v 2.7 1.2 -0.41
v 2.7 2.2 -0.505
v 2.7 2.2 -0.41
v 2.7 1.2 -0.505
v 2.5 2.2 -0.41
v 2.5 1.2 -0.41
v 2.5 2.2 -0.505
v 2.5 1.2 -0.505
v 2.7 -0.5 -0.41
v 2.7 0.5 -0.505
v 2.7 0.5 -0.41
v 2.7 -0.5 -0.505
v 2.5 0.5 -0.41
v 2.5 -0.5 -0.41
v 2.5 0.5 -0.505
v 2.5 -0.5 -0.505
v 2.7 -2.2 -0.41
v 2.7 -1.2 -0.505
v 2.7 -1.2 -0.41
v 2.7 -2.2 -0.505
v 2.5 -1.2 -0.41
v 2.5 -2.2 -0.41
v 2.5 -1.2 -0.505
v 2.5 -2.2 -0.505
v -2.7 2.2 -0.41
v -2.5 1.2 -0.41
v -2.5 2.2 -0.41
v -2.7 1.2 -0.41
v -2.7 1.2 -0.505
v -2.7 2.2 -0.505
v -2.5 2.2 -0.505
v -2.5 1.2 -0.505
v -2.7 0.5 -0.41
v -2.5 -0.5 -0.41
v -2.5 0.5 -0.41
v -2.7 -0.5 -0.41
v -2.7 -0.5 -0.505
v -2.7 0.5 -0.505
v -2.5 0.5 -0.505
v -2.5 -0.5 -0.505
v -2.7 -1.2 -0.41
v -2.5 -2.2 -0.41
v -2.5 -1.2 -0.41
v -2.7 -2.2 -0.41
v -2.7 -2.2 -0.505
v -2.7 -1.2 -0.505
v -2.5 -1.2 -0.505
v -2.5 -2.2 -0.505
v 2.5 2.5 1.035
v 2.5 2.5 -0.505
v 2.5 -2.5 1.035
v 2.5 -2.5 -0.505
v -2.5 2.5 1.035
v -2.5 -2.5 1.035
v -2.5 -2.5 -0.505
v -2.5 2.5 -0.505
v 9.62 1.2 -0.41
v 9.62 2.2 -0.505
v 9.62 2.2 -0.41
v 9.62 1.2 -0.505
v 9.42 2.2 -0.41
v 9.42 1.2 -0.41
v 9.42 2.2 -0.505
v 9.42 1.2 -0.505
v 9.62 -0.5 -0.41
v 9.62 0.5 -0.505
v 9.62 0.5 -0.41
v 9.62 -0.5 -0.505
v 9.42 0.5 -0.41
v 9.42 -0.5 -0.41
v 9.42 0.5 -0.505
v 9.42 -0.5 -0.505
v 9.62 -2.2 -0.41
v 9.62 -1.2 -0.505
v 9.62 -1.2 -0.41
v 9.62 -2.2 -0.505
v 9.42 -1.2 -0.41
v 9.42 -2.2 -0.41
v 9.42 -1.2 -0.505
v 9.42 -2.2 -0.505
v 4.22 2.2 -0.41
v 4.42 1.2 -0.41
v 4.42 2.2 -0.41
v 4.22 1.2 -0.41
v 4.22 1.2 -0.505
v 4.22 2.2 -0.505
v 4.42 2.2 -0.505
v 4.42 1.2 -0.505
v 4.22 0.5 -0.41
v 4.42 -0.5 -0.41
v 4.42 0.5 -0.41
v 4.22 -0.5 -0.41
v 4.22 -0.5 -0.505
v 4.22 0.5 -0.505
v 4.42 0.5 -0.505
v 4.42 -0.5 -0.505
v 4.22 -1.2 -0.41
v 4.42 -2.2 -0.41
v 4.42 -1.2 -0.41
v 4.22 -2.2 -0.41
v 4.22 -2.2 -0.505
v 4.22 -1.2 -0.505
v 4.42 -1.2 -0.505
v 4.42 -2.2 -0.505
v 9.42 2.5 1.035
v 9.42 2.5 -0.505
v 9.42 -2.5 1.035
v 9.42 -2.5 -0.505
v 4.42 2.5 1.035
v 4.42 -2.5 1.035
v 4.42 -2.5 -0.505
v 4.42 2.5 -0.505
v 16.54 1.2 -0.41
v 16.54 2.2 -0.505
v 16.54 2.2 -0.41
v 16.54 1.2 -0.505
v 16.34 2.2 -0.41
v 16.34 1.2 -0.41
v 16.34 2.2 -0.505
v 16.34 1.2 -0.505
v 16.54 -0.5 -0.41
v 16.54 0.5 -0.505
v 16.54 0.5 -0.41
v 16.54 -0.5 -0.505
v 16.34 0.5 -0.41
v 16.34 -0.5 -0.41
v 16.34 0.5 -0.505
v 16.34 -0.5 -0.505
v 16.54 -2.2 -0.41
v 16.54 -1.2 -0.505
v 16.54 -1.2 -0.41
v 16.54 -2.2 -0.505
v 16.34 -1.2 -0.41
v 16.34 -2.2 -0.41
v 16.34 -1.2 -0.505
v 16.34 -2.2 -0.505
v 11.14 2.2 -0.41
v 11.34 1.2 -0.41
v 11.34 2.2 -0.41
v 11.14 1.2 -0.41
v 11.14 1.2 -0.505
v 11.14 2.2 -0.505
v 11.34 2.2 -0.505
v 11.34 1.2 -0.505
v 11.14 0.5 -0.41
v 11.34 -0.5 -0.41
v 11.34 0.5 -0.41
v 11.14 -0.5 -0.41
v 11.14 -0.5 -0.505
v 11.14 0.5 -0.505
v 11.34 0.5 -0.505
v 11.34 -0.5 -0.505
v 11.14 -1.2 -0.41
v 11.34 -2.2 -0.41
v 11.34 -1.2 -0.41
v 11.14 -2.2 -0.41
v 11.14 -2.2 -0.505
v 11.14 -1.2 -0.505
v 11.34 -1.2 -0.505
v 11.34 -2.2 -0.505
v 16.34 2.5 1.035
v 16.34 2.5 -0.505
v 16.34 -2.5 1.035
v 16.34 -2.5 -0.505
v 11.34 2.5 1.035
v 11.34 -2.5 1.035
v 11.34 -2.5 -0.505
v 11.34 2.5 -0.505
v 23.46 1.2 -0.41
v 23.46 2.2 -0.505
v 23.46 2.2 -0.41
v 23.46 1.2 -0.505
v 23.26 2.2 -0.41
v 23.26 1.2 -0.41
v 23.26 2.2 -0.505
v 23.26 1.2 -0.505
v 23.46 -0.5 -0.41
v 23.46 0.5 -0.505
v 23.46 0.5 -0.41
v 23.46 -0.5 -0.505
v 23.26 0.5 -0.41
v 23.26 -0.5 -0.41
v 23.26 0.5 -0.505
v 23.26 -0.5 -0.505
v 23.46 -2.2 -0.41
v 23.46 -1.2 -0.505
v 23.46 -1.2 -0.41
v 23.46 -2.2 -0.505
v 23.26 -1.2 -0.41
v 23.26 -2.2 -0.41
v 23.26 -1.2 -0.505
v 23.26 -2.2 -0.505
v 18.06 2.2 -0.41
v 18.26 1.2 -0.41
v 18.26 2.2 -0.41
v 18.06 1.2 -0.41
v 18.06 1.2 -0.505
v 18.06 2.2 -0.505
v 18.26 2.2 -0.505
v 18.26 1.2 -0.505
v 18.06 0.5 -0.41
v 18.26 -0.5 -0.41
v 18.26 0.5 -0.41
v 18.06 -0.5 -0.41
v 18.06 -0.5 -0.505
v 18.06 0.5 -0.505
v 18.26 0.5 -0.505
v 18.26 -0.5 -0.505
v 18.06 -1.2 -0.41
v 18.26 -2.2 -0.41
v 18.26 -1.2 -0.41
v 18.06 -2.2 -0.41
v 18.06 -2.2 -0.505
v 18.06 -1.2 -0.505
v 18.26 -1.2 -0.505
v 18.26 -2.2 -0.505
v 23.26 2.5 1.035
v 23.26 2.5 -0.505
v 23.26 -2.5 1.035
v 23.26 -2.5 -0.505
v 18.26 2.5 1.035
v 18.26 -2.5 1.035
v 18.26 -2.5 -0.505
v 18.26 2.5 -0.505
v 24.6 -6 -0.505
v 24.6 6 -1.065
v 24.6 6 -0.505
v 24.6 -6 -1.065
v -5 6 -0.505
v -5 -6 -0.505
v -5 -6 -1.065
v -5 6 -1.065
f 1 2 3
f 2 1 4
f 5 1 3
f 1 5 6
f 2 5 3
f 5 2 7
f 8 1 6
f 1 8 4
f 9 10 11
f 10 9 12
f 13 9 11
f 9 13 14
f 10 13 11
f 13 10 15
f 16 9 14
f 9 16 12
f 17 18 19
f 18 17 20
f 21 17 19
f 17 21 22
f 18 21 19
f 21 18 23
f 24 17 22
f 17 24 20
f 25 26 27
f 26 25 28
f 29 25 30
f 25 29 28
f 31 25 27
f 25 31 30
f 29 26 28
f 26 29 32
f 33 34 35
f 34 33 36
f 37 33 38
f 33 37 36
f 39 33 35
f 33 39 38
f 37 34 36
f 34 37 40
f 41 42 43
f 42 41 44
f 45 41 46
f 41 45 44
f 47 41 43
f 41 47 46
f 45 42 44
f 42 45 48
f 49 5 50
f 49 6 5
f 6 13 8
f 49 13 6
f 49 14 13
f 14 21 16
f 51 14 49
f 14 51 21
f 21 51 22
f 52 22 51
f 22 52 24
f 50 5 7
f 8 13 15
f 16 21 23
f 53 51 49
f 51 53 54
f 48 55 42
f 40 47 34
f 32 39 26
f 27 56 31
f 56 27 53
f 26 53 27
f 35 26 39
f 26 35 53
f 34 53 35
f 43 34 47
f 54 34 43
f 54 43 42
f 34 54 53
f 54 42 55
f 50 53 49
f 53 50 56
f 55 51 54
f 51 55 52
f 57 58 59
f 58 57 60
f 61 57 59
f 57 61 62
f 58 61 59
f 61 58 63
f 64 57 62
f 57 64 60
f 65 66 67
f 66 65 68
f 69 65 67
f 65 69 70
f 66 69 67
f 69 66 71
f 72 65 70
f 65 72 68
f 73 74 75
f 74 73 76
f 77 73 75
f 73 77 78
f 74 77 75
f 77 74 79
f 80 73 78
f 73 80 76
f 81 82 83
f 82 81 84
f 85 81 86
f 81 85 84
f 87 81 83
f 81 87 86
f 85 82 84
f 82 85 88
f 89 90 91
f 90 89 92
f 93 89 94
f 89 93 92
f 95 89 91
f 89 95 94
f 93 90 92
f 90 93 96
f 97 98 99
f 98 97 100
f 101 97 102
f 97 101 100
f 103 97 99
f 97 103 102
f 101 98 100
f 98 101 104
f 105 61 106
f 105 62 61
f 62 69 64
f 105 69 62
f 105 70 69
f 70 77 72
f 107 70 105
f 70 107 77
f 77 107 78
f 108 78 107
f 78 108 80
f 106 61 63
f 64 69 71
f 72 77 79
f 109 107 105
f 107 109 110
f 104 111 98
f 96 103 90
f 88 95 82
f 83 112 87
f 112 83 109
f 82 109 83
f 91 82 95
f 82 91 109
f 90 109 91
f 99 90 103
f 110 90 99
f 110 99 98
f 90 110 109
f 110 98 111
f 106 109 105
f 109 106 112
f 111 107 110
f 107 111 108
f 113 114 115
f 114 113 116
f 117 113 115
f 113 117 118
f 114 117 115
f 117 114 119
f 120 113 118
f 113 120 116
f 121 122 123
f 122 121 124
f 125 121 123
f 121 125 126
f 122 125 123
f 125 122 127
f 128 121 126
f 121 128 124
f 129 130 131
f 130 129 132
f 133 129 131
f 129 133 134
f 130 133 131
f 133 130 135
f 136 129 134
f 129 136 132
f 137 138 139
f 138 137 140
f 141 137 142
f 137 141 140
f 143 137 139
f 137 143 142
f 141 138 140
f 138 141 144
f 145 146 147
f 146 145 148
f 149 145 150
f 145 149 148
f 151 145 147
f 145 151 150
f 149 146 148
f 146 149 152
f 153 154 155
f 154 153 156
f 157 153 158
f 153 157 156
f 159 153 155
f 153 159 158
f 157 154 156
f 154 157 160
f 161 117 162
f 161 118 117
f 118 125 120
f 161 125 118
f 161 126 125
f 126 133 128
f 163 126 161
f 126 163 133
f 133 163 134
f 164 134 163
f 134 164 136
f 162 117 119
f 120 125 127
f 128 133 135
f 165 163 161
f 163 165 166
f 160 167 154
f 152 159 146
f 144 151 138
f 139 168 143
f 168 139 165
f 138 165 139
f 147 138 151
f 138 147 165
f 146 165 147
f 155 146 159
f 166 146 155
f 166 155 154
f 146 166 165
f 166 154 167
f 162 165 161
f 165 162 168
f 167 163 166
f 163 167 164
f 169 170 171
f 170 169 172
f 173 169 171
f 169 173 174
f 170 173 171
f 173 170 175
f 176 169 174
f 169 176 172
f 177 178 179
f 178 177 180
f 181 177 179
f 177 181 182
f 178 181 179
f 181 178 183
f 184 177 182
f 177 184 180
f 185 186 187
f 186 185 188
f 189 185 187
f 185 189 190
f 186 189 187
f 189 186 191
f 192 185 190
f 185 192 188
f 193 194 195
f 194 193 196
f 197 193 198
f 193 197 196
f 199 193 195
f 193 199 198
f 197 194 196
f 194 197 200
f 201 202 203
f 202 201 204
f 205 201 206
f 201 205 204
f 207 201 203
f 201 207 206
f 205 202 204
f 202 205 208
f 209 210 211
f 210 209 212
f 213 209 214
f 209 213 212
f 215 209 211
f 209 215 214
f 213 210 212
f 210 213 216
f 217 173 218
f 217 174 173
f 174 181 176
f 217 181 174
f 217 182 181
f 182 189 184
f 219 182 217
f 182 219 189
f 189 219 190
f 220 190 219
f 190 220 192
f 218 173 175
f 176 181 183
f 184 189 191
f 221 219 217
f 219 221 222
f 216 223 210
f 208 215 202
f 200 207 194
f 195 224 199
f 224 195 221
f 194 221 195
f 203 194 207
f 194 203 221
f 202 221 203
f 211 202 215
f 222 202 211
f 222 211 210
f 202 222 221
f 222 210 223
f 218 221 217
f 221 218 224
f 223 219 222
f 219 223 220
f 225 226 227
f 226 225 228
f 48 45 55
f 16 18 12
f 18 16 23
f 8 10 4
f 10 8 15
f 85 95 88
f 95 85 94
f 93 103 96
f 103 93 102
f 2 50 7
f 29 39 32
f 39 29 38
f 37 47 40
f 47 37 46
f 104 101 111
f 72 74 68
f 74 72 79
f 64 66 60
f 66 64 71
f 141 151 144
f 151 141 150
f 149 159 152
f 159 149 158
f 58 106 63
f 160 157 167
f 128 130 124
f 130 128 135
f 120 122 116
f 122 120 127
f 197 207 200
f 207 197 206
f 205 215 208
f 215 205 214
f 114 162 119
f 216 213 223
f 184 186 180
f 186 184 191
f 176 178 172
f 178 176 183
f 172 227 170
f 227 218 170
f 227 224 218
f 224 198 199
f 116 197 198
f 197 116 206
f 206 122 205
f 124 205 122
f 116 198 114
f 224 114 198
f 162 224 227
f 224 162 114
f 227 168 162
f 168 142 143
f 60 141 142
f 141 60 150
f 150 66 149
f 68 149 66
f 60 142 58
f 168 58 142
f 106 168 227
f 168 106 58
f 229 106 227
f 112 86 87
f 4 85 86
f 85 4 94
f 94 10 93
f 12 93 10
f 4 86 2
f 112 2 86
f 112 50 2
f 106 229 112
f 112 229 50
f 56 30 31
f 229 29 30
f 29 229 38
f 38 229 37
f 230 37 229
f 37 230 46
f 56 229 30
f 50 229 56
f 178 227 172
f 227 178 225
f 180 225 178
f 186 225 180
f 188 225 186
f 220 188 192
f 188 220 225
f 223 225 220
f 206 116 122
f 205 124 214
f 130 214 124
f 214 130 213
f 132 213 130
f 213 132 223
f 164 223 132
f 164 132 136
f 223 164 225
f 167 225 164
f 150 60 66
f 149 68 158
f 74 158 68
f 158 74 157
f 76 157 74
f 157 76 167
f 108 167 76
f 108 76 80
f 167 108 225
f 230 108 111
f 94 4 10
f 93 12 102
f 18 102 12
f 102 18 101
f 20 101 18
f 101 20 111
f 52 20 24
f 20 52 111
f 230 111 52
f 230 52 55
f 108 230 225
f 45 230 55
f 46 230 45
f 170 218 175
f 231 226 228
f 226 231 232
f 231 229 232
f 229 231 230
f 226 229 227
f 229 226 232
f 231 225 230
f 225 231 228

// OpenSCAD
/*
Module: WS2812B LED strip
BTF Lighting WS2812b 5050smd LED 3.3ft 144 (2x72) pixel strips
https://www.amazon.com/gp/product/B01CDTEJR0/

https://cdn-shop.adafruit.com/datasheets/WS2812.pdf
*/

/*
Parameters
*/

// Finish/Quality
$fn = 90; // [0:90:120]

// Number of LEDs in the strip
num_leds  = 4; // [0:1:72]

// Pitch of the LEDs
led_pitch = 1.92; // [0:0.01:25]

///< Parameters after this are hidden from the customizer
module __Customizer_Limit__(){}

// WS2812B
ws2812b_w = 5.0;
ws2812b_d = 5.0;
ws2812b_h = 1.57;

solder_pad_w = 1.5;
solder_pad_d = 1.0;
solder_pad_h = 0.25;

ws2812_package_w = 5.4;
pad_span_d       = 4.2;
pad_pitch        = 0.6;
pad_x_offset     = ( ws2812_package_w - ws2812b_w )/2;
pad_x            = ( ws2812b_w/2 ) - ( solder_pad_w/2 ) + pad_x_offset;
pad_y_offset     = ( ws2812b_d-pad_span_d );
pad_y            = ws2812b_d/2-pad_y_offset;


// Strip Width
strip_d = 12;   // [0:0.01:15]
strip_h = 2.13 - ws2812b_h; // [0:0.01:5]

///< Modules
module ws2812b(center = true, show_pads = true ){
    color("white")cube( [ws2812b_w, ws2812b_d, ws2812b_h], center = center );
    color("yellow")cylinder( h = ws2812b_h, d = ws2812b_w*0.90, center = center );

    module pad(){
        color("silver")cube( [ solder_pad_w, solder_pad_d, solder_pad_h ], center = center );
    }

    module pads(side = 1){
        //< Side 1 or -1
        translate([side * pad_x ,pad_y, -ws2812b_h/2]) pad();
        translate([side * pad_x ,0,     -ws2812b_h/2]) pad();
        translate([side * pad_x ,-pad_y,-ws2812b_h/2]) pad();
    }

    if( show_pads ){
        pads();
        pads(-1);
    }
}


function ribbon_w( n = 1, p = 1 ) = ( (n+1)*p ) + (n*ws2812b_w) ;

module strip( n = num_leds, pitch = 1, center = true ){

    for( i = [0:n-1] ){
        x = i * ( pitch + ws2812b_w );
        translate([x,0,solder_pad_h])
            ws2812b(center);
    }
    strip_w = ribbon_w(n, pitch);
    adjust  = strip_w/2 - ws2812b_w;
    translate([ adjust, 0, -ws2812b_h/2 ] )
        color("black")cube( [ strip_w, strip_d, strip_h ], center = center );
}

///< Build object
strip(num_leds, led_pitch);
